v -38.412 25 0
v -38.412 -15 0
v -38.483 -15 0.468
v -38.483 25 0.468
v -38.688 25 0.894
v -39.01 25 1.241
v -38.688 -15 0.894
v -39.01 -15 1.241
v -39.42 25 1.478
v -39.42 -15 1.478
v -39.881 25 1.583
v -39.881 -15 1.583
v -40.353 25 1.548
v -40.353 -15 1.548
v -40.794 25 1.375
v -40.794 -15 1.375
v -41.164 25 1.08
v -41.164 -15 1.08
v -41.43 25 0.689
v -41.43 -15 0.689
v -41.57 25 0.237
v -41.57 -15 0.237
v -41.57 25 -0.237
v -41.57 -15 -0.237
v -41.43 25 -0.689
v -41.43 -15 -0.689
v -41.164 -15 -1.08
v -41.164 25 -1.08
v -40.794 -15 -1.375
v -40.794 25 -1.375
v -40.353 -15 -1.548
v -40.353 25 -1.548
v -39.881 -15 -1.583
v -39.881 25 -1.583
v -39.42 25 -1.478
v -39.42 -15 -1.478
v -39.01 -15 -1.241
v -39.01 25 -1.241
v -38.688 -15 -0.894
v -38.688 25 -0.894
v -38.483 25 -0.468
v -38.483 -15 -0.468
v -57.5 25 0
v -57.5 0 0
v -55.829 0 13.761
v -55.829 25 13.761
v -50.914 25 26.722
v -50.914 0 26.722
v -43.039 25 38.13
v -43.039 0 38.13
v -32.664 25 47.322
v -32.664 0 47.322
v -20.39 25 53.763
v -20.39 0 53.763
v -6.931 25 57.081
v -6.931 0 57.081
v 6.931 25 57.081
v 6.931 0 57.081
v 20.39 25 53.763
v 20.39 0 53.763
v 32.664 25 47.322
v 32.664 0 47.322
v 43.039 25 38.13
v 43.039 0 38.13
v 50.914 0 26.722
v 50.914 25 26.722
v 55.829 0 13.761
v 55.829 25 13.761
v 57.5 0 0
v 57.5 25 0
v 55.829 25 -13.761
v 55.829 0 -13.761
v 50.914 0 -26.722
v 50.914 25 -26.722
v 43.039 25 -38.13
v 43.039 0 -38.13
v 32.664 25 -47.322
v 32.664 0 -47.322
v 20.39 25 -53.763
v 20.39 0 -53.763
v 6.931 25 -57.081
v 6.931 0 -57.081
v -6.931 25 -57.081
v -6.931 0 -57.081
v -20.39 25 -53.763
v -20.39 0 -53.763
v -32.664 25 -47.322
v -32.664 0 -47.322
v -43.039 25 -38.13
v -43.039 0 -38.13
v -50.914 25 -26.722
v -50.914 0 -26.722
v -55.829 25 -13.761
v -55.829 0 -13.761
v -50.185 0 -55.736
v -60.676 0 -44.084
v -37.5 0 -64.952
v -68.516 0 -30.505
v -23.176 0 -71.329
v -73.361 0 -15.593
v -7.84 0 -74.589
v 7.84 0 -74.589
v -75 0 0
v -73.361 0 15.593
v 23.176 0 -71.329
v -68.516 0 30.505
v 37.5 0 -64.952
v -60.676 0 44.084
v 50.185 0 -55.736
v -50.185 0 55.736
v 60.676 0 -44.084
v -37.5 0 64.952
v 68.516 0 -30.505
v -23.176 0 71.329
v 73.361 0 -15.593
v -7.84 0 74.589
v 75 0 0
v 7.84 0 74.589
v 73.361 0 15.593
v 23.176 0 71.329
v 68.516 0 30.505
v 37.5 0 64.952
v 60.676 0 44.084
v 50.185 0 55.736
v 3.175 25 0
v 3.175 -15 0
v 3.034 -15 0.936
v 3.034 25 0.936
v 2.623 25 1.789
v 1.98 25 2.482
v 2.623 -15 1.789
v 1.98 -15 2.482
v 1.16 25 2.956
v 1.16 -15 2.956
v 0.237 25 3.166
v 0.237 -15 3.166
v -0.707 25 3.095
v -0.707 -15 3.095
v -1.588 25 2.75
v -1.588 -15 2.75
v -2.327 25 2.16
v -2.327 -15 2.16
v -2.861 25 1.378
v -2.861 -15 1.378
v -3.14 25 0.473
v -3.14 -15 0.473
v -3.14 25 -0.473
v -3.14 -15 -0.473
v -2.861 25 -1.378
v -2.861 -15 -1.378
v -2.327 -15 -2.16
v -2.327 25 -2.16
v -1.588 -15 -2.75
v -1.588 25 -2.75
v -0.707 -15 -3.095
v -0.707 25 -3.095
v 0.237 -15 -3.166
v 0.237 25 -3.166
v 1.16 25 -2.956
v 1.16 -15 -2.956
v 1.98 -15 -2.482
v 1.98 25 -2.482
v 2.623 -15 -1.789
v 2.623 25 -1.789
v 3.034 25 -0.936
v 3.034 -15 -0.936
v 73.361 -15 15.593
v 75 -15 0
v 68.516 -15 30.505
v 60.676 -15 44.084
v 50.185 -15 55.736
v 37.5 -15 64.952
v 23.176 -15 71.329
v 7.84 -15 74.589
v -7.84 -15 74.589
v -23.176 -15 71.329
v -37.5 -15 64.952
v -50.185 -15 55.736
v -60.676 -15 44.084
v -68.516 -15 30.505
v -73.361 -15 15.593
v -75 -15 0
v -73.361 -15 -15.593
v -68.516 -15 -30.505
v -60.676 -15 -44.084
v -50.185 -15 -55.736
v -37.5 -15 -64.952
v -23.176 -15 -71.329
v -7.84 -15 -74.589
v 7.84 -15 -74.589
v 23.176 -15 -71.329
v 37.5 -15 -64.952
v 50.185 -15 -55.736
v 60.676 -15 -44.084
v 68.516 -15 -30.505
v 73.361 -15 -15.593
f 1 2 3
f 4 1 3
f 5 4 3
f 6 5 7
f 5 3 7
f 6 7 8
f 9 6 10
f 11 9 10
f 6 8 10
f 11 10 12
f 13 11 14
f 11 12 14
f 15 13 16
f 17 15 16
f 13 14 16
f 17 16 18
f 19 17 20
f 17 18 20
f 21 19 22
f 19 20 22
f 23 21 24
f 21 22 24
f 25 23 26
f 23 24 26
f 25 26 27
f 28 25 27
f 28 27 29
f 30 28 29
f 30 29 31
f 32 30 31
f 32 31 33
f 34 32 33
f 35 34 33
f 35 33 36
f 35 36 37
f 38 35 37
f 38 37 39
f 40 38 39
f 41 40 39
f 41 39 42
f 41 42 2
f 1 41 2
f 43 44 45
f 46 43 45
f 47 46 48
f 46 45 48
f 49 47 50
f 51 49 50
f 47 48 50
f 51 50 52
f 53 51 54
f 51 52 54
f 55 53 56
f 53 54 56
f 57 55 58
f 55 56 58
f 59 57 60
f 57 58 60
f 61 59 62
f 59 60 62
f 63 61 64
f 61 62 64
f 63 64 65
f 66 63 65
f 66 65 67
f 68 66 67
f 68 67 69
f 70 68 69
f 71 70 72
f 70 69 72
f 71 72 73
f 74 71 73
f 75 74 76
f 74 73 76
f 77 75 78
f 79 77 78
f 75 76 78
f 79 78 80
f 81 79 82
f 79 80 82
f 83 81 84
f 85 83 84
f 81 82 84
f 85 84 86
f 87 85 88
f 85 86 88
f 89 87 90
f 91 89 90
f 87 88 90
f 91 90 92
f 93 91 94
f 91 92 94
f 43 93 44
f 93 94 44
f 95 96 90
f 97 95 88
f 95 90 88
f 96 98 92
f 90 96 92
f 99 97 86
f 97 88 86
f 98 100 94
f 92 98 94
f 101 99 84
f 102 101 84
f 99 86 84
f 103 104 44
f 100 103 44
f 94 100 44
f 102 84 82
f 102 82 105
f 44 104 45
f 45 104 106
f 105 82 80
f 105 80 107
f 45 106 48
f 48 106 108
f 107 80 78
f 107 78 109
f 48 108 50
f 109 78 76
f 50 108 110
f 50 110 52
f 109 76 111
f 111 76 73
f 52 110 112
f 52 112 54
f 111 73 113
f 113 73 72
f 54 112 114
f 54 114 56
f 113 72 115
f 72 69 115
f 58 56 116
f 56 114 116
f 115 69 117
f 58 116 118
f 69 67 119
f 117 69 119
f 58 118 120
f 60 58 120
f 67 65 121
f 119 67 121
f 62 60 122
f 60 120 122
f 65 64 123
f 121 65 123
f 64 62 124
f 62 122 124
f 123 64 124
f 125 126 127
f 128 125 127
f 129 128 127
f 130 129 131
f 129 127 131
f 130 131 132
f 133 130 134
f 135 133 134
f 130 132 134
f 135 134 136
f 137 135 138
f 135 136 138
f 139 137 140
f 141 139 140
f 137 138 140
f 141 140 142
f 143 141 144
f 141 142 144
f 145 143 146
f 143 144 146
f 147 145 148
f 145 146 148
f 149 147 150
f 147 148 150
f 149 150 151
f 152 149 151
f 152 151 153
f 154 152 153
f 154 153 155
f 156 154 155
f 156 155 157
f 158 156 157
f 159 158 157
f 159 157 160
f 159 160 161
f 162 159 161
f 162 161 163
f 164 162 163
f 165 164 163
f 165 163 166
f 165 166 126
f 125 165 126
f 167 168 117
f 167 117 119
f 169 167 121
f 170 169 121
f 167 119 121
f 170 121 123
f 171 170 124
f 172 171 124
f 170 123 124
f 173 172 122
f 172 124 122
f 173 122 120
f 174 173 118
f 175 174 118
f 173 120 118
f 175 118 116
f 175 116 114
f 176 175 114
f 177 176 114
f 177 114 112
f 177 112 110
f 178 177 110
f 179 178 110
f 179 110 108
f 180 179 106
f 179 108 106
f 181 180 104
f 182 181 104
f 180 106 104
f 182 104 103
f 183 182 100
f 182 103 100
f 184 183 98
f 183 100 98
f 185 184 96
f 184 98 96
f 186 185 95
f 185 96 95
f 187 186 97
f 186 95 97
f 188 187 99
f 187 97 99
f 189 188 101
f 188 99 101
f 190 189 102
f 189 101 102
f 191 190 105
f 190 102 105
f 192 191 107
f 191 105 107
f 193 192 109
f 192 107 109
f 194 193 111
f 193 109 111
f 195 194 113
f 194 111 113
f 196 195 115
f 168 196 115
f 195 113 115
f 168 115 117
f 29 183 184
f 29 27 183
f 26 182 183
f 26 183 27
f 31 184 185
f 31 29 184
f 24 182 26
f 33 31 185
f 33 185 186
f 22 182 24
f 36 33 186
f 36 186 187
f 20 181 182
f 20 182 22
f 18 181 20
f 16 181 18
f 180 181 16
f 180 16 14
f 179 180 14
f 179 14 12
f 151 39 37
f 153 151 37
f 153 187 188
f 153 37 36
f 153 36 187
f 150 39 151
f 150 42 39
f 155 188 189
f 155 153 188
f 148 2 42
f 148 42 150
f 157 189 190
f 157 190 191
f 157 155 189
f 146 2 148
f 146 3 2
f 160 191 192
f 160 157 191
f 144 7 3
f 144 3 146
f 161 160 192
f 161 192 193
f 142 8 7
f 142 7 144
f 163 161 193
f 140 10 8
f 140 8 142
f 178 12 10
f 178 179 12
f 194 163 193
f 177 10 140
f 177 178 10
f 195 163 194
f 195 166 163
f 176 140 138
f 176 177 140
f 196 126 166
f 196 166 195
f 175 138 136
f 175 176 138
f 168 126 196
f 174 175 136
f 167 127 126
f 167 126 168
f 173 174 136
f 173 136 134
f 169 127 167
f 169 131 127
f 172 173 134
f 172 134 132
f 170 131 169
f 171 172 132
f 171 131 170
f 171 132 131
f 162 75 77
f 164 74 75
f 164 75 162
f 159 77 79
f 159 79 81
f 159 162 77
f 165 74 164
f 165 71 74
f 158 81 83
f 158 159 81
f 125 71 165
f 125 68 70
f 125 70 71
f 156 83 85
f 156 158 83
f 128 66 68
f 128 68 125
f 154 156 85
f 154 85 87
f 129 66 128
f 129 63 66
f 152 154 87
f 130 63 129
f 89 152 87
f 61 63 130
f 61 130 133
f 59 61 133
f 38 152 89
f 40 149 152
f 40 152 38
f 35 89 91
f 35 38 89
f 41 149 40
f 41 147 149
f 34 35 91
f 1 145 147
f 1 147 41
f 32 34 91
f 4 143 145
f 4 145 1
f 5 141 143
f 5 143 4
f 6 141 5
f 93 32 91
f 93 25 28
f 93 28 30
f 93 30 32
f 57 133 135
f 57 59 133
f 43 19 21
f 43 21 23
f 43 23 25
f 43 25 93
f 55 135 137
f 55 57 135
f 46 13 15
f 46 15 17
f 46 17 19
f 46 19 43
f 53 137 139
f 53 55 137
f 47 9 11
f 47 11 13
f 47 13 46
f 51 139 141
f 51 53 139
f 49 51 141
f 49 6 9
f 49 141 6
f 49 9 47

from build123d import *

# Parameters (mm, degrees)
F0_R     = 75
F1_DEPTH = 15
F2_R     = 57.5
F3_DEPTH = 25
F4_R     = 3.175
F4_R_2   = 1.5875
F5_DEPTH = 40.001


with BuildPart() as f1:
    # F0 (on Front) → F1 (new body)
    with BuildSketch(Plane.XZ):
        Circle(F0_R)
    extrude(amount=F1_DEPTH)

    # F2 (on face) → F3 (join)
    with BuildSketch(Plane(origin=(0, 0, 0), x_dir=(-1, 0, 0), z_dir=(0, 1, 0))):
        Circle(F2_R)
    extrude(amount=F3_DEPTH)

    # F4 (on face) → F5 (cut, through all)
    with BuildSketch(Plane.XZ.offset(15)):
        Circle(F4_R)
        with Locations((-40, 0)):
            Circle(F4_R_2)
    extrude(amount=-F5_DEPTH, mode=Mode.SUBTRACT)


solid = f1.part
